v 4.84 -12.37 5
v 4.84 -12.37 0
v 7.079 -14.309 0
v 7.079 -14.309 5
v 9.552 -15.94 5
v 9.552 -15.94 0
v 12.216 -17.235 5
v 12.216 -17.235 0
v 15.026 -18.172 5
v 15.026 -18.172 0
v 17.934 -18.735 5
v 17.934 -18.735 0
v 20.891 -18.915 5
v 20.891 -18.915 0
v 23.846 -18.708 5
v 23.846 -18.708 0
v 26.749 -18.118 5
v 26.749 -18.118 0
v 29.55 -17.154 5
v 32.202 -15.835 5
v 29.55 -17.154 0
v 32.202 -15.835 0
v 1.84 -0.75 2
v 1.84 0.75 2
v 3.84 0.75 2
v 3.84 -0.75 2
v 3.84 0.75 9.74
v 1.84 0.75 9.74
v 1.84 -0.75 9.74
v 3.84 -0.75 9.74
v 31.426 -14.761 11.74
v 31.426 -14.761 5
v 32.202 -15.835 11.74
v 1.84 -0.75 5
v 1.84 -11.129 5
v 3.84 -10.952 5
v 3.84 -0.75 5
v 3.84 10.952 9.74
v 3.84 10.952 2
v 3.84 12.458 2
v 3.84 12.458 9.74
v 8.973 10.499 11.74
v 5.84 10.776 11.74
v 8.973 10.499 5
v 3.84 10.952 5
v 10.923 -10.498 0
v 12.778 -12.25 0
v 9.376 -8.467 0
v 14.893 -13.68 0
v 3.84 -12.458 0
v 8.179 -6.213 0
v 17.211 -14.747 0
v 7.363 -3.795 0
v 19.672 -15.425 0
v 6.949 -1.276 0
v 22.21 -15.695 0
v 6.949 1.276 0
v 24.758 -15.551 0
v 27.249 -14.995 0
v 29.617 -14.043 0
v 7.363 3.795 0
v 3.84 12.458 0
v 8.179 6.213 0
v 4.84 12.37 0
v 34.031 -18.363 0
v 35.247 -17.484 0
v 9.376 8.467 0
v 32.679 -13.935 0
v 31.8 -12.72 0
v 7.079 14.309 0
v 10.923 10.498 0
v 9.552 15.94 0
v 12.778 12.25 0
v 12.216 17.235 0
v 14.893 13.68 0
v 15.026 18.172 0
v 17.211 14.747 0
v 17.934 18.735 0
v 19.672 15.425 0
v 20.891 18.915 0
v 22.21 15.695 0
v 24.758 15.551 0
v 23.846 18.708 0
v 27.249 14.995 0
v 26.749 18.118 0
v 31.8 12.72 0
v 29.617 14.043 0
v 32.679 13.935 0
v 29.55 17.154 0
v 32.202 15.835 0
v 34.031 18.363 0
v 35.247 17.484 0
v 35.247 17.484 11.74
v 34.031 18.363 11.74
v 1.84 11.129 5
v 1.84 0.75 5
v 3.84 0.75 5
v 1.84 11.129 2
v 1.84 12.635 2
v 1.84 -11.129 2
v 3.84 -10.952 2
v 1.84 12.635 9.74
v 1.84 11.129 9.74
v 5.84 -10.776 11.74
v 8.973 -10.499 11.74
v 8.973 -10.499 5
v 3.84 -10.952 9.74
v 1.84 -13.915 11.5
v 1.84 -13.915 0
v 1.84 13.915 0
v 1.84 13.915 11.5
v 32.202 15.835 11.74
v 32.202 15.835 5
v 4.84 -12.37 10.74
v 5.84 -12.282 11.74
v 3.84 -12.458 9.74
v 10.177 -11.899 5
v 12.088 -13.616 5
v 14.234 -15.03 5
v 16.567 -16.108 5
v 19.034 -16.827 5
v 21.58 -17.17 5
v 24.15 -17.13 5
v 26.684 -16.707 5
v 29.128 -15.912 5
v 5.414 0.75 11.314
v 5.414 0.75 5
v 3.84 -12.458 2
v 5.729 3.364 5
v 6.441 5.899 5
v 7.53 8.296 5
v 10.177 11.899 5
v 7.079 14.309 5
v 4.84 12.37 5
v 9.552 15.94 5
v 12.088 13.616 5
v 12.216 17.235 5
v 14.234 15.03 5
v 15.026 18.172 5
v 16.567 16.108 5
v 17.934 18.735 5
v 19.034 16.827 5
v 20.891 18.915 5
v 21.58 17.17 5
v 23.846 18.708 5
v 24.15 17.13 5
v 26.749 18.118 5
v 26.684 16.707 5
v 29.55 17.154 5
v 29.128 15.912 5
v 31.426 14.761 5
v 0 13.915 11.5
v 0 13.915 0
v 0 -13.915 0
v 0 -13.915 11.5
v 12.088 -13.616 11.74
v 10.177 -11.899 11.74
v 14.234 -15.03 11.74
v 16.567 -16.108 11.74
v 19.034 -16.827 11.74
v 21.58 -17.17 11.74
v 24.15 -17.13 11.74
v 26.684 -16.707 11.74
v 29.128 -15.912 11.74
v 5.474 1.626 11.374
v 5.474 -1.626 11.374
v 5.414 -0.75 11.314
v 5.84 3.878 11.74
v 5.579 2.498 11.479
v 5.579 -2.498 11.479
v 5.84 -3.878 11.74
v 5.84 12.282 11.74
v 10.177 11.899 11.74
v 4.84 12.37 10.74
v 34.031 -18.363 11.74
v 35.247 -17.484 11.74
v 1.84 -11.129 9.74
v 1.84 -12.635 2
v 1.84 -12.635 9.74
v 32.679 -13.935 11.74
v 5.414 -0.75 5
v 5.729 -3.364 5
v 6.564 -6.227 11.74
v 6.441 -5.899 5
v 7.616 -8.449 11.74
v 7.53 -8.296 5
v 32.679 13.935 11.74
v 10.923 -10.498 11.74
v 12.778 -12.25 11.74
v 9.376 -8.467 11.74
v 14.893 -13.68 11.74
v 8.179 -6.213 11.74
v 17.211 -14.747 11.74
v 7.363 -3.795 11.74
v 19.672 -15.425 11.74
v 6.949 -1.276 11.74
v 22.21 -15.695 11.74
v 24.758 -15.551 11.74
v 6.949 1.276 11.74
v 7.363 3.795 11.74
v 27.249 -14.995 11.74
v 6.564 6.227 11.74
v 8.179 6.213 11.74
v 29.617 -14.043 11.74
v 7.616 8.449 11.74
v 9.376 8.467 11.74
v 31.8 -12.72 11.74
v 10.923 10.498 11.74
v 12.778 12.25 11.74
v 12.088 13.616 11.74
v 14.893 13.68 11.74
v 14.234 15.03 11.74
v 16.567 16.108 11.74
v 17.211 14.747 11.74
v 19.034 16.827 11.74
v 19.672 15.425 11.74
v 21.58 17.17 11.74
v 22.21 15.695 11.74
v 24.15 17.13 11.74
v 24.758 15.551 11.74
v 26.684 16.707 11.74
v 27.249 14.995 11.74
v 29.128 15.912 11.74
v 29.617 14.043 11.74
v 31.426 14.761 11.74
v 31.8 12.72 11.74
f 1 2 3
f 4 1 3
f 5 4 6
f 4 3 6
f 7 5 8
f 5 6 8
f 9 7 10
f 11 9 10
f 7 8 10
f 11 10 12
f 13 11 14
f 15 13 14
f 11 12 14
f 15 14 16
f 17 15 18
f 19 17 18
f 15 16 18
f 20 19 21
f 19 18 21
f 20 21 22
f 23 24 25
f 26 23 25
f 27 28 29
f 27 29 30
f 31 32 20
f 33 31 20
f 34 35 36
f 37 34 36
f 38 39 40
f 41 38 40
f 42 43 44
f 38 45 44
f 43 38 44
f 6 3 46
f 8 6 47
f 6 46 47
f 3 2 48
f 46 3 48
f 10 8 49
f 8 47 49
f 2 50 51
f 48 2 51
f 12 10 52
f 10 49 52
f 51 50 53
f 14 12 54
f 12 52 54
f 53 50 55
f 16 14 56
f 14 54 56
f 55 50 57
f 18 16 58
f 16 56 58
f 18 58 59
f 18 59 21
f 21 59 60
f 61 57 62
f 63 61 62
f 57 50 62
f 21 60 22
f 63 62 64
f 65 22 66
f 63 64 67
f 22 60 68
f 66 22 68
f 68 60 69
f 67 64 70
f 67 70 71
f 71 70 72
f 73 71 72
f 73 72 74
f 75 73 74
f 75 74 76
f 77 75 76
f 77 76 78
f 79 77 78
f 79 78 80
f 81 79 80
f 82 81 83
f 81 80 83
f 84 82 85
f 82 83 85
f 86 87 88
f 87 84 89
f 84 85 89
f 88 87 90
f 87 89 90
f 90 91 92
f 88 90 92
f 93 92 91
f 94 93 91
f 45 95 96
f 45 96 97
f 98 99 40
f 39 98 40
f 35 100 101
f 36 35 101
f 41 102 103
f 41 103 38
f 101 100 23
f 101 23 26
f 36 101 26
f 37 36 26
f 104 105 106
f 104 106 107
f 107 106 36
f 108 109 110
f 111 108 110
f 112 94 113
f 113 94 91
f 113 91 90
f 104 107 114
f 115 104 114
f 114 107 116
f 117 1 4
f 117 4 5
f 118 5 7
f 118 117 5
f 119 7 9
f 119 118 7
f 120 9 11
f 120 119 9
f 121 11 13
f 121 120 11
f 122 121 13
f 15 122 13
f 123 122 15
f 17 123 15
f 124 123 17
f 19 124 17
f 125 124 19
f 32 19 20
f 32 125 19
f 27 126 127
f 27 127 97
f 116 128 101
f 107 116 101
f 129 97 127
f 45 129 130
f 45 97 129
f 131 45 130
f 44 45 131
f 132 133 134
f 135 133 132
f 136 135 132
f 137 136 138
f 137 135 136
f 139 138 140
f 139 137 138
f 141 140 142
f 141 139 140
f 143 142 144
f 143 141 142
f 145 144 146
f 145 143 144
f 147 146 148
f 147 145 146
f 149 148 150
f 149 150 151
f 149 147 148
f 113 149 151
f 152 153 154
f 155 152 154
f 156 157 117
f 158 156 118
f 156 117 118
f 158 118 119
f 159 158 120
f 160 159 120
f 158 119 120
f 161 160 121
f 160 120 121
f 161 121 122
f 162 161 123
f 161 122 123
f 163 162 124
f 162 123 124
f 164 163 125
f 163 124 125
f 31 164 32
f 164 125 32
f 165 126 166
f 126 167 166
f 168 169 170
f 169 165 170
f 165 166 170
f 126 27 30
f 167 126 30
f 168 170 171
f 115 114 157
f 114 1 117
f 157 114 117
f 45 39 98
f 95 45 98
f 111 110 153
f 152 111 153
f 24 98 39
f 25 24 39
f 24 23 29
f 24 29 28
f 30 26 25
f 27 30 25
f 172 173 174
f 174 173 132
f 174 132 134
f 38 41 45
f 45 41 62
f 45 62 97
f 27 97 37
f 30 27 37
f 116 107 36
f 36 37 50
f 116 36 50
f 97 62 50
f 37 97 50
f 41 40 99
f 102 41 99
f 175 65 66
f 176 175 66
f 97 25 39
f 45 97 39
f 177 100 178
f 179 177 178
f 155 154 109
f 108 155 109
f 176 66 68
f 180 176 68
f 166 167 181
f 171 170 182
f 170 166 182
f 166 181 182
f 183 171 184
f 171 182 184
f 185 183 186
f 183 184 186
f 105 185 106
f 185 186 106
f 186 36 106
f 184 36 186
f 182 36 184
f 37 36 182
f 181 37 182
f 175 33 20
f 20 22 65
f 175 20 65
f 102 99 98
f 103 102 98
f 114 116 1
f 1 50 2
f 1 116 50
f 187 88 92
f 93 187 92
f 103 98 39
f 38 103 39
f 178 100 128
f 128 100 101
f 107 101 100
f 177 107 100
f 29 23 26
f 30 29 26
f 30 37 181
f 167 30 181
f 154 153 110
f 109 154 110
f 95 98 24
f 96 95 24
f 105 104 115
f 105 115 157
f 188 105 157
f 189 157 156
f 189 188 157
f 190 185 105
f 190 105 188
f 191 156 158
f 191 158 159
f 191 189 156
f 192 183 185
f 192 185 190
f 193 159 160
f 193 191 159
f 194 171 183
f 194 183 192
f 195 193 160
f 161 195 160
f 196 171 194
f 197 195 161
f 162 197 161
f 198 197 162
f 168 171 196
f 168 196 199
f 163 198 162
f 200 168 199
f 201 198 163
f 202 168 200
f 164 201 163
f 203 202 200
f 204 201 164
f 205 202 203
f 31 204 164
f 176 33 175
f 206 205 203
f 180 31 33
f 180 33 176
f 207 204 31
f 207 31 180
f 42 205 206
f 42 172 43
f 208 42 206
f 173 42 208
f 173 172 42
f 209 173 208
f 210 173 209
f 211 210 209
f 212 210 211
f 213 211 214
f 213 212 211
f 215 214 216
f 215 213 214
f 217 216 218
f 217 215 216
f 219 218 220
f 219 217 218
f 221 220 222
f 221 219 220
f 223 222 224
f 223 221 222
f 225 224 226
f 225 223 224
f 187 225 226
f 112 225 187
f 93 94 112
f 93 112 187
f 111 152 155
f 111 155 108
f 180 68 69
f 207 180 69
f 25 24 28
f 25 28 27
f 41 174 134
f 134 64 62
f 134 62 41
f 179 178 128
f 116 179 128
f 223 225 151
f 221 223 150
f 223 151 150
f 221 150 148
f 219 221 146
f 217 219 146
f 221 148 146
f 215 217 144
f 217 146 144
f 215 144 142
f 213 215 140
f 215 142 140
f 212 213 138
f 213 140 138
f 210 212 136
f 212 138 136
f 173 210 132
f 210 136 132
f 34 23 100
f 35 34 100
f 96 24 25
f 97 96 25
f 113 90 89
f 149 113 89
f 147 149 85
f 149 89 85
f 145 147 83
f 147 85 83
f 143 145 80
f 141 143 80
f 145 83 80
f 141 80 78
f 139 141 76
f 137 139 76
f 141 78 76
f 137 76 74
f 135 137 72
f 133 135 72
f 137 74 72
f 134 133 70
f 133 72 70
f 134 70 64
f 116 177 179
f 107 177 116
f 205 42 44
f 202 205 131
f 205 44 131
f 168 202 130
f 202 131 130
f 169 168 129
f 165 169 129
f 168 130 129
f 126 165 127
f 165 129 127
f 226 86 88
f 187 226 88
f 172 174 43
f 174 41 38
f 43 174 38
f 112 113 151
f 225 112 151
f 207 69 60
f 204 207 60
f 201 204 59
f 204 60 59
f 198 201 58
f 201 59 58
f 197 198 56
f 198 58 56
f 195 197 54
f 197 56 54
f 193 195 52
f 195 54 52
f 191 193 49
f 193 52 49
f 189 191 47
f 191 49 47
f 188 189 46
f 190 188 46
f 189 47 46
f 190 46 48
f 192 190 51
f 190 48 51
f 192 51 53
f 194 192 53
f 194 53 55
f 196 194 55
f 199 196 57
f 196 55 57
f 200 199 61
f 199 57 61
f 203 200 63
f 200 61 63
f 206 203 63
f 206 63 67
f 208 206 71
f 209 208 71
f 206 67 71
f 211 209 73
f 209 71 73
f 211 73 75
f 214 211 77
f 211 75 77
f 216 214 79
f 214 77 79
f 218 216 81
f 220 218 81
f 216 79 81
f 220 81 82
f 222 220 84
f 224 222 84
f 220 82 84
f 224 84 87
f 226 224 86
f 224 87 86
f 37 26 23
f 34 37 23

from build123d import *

# Parameters (mm, degrees)
F1_DEPTH = 11.74
F2_DEPTH = 5
F3_START = 2
F0_W     = 2
F0_H     = 1.5
F3_DEPTH = 7.74
F4_START = 2
F4_DEPTH = 3
F5_SIZE  = 2
F6_DEPTH = 11.5


# Not quite as in the source:
# - a feature names something its author has since deleted; it is built from what else it names


with BuildPart() as f1:
    # F0 (on Top) → F1 (new body)
    with BuildSketch(Plane.XY):
        with BuildLine():
            Line((5.4135556037, 0.75), (3.84, 0.75))
            Line((3.84, 0.75), (3.84, -0.75))
            Line((3.84, -0.75), (5.4135556037, -0.75))
            ThreePointArc((5.4135556037, -0.75), (5.3971960795, 0), (5.4135556037, 0.75))
        make_face()
        with BuildLine():
            ThreePointArc((10.1768930953, 11.8985744432), (9.5563193063, 11.2149691478), (8.9733212638, 10.499049243))
            ThreePointArc((8.9733212638, 10.499049243), (6.4405646269, 5.8994287949), (5.4135556037, 0.75))
            ThreePointArc((5.4135556037, 0.75), (5.3971960795, 0), (5.4135556037, -0.75))
            ThreePointArc((5.4135556037, -0.75), (6.4405646269, -5.8994287949), (8.9733212638, -10.499049243))
            ThreePointArc((8.9733212638, -10.499049243), (9.5563193063, -11.2149691478), (10.1768930953, -11.8985744432))
            ThreePointArc((10.1768930953, -11.8985744432), (20.3005620248, -17.0459811105), (31.425549646, -14.7614421147))
            ThreePointArc((31.425549646, -14.7614421147), (32.0614181574, -14.3620507052), (32.6792487822, -13.9352866242))
            Line((32.6792487822, -13.9352866242), (31.8, -12.72))
            ThreePointArc((31.8, -12.72), (6.8971960795, 0), (31.8, 12.72))
            Line((31.8, 12.72), (32.6792487822, 13.9352866242))
            ThreePointArc((32.6792487822, 13.9352866242), (32.0614181574, 14.3620507052), (31.425549646, 14.7614421147))
            ThreePointArc((31.425549646, 14.7614421147), (20.3005620248, 17.0459811105), (10.1768930953, 11.8985744432))
        make_face()
        with BuildLine():
            Line((31.425549646, -14.7614421147), (32.2020357723, -15.8346914866))
            Line((32.2020357723, -15.8346914866), (34.0313686021, -18.3631723491))
            Line((34.0313686021, -18.3631723491), (35.2466552263, -17.4839235669))
            Line((35.2466552263, -17.4839235669), (32.6792487822, -13.9352866242))
            ThreePointArc((32.6792487822, -13.9352866242), (32.0614181574, -14.3620507052), (31.425549646, -14.7614421147))
        make_face()
        with BuildLine():
            Line((34.0313686021, 18.3631723491), (32.2020357723, 15.8346914866))
            Line((32.2020357723, 15.8346914866), (31.425549646, 14.7614421147))
            ThreePointArc((31.425549646, 14.7614421147), (32.0614181574, 14.3620507052), (32.6792487822, 13.9352866242))
            Line((32.6792487822, 13.9352866242), (35.2466552263, 17.4839235669))
            Line((35.2466552263, 17.4839235669), (34.0313686021, 18.3631723491))
        make_face()
        with BuildLine():
            Line((4.84, 12.37), (3.84, 12.4583333333))
            Line((3.84, 12.4583333333), (3.84, 10.9524926213))
            Line((3.84, 10.9524926213), (8.9733212638, 10.499049243))
            ThreePointArc((8.9733212638, 10.499049243), (9.5563193063, 11.2149691478), (10.1768930953, 11.8985744432))
            Line((10.1768930953, 11.8985744432), (4.84, 12.37))
        make_face()
        with BuildLine():
            Line((3.84, -10.9524926213), (3.84, -12.4583333333))
            Line((3.84, -12.4583333333), (4.84, -12.37))
            Line((4.84, -12.37), (10.1768930953, -11.8985744432))
            ThreePointArc((10.1768930953, -11.8985744432), (9.5563193063, -11.2149691478), (8.9733212638, -10.499049243))
            Line((8.9733212638, -10.499049243), (3.84, -10.9524926213))
        make_face()
    extrude(amount=F1_DEPTH)

    # F0 (on Top) → F2 (join)
    with BuildSketch(Plane.XY):
        with BuildLine():
            ThreePointArc((32.2020357723, 15.8346914866), (17.9343865068, 18.7352052196), (4.84, 12.37))
            Line((4.84, 12.37), (10.1768930953, 11.8985744432))
            ThreePointArc((10.1768930953, 11.8985744432), (20.3005620248, 17.0459811105), (31.425549646, 14.7614421147))
            Line((31.425549646, 14.7614421147), (32.2020357723, 15.8346914866))
        make_face()
        with BuildLine():
            Line((10.1768930953, -11.8985744432), (4.84, -12.37))
            ThreePointArc((4.84, -12.37), (17.9343865068, -18.7352052196), (32.2020357723, -15.8346914866))
            Line((32.2020357723, -15.8346914866), (31.425549646, -14.7614421147))
            ThreePointArc((31.425549646, -14.7614421147), (20.3005620248, -17.0459811105), (10.1768930953, -11.8985744432))
        make_face()
        with BuildLine():
            Line((3.84, -0.75), (3.84, -10.9524926213))
            Line((3.84, -10.9524926213), (8.9733212638, -10.499049243))
            ThreePointArc((8.9733212638, -10.499049243), (6.4405646269, -5.8994287949), (5.4135556037, -0.75))
            Line((5.4135556037, -0.75), (3.84, -0.75))
        make_face()
        with BuildLine():
            Line((8.9733212638, 10.499049243), (3.84, 10.9524926213))
            Line((3.84, 10.9524926213), (3.84, 0.75))
            Line((3.84, 0.75), (5.4135556037, 0.75))
            ThreePointArc((5.4135556037, 0.75), (6.4405646269, 5.8994287949), (8.9733212638, 10.499049243))
        make_face()
    extrude(amount=F2_DEPTH)

    # F5
    f5_edges = [f1.edges().sort_by_distance(p)[0] for p in [
        (3.84, 0, 11.74),
        (3.84, -11.705413, 11.74),
        (3.84, 11.705413, 11.74),
    ]]
    chamfer(f5_edges, length=F5_SIZE)


with BuildPart() as f3:
    # F0 (on Top) → F3 (new body)
    with BuildSketch(Plane.XY.offset(F3_START)):
        with Locations((2.84, 0)):
            Rectangle(F0_W, F0_H)
    extrude(amount=F3_DEPTH)


with BuildPart() as f3b:
    # F0 (on Top) → F3, piece 2 (new body)
    with BuildSketch(Plane.XY.offset(F3_START)):
        Polygon((1.84, -11.129159288), (1.84, -12.635), (3.84, -12.4583333333), (3.84, -10.9524926213), align=None)
    extrude(amount=F3_DEPTH)


with BuildPart() as f3c:
    # F0 (on Top) → F3, piece 3 (new body)
    with BuildSketch(Plane.XY.offset(F3_START)):
        Polygon((3.84, 12.4583333333), (1.84, 12.635), (1.84, 11.129159288), (3.84, 10.9524926213), align=None)
    extrude(amount=F3_DEPTH)


with BuildPart() as f4:
    # F0 (on Top) → F4 (new body)
    with BuildSketch(Plane.XY.offset(F4_START)):
        Polygon((3.84, 10.9524926213), (1.84, 11.129159288), (1.84, 0.75), (3.84, 0.75), align=None)
    extrude(amount=F4_DEPTH)


with BuildPart() as f4b:
    # F0 (on Top) → F4, piece 2 (new body)
    with BuildSketch(Plane.XY.offset(F4_START)):
        Polygon((1.84, -0.75), (1.84, -11.129159288), (3.84, -10.9524926213), (3.84, -0.75), align=None)
    extrude(amount=F4_DEPTH)


with BuildPart() as f6:
    # F0 (on Top) → F6 (new body)
    with BuildSketch(Plane.XY):
        Polygon((1.84, 13.915), (0, 13.915), (0, -13.915), (1.84, -13.915), (1.84, -12.635), (1.84, -11.129159288), (1.84, -0.75), (1.84, 0.75), (1.84, 11.129159288), (1.84, 12.635), align=None)
    extrude(amount=F6_DEPTH)


solid = Compound([f1.part, f3.part, f3b.part, f3c.part, f4.part, f4b.part, f6.part])
